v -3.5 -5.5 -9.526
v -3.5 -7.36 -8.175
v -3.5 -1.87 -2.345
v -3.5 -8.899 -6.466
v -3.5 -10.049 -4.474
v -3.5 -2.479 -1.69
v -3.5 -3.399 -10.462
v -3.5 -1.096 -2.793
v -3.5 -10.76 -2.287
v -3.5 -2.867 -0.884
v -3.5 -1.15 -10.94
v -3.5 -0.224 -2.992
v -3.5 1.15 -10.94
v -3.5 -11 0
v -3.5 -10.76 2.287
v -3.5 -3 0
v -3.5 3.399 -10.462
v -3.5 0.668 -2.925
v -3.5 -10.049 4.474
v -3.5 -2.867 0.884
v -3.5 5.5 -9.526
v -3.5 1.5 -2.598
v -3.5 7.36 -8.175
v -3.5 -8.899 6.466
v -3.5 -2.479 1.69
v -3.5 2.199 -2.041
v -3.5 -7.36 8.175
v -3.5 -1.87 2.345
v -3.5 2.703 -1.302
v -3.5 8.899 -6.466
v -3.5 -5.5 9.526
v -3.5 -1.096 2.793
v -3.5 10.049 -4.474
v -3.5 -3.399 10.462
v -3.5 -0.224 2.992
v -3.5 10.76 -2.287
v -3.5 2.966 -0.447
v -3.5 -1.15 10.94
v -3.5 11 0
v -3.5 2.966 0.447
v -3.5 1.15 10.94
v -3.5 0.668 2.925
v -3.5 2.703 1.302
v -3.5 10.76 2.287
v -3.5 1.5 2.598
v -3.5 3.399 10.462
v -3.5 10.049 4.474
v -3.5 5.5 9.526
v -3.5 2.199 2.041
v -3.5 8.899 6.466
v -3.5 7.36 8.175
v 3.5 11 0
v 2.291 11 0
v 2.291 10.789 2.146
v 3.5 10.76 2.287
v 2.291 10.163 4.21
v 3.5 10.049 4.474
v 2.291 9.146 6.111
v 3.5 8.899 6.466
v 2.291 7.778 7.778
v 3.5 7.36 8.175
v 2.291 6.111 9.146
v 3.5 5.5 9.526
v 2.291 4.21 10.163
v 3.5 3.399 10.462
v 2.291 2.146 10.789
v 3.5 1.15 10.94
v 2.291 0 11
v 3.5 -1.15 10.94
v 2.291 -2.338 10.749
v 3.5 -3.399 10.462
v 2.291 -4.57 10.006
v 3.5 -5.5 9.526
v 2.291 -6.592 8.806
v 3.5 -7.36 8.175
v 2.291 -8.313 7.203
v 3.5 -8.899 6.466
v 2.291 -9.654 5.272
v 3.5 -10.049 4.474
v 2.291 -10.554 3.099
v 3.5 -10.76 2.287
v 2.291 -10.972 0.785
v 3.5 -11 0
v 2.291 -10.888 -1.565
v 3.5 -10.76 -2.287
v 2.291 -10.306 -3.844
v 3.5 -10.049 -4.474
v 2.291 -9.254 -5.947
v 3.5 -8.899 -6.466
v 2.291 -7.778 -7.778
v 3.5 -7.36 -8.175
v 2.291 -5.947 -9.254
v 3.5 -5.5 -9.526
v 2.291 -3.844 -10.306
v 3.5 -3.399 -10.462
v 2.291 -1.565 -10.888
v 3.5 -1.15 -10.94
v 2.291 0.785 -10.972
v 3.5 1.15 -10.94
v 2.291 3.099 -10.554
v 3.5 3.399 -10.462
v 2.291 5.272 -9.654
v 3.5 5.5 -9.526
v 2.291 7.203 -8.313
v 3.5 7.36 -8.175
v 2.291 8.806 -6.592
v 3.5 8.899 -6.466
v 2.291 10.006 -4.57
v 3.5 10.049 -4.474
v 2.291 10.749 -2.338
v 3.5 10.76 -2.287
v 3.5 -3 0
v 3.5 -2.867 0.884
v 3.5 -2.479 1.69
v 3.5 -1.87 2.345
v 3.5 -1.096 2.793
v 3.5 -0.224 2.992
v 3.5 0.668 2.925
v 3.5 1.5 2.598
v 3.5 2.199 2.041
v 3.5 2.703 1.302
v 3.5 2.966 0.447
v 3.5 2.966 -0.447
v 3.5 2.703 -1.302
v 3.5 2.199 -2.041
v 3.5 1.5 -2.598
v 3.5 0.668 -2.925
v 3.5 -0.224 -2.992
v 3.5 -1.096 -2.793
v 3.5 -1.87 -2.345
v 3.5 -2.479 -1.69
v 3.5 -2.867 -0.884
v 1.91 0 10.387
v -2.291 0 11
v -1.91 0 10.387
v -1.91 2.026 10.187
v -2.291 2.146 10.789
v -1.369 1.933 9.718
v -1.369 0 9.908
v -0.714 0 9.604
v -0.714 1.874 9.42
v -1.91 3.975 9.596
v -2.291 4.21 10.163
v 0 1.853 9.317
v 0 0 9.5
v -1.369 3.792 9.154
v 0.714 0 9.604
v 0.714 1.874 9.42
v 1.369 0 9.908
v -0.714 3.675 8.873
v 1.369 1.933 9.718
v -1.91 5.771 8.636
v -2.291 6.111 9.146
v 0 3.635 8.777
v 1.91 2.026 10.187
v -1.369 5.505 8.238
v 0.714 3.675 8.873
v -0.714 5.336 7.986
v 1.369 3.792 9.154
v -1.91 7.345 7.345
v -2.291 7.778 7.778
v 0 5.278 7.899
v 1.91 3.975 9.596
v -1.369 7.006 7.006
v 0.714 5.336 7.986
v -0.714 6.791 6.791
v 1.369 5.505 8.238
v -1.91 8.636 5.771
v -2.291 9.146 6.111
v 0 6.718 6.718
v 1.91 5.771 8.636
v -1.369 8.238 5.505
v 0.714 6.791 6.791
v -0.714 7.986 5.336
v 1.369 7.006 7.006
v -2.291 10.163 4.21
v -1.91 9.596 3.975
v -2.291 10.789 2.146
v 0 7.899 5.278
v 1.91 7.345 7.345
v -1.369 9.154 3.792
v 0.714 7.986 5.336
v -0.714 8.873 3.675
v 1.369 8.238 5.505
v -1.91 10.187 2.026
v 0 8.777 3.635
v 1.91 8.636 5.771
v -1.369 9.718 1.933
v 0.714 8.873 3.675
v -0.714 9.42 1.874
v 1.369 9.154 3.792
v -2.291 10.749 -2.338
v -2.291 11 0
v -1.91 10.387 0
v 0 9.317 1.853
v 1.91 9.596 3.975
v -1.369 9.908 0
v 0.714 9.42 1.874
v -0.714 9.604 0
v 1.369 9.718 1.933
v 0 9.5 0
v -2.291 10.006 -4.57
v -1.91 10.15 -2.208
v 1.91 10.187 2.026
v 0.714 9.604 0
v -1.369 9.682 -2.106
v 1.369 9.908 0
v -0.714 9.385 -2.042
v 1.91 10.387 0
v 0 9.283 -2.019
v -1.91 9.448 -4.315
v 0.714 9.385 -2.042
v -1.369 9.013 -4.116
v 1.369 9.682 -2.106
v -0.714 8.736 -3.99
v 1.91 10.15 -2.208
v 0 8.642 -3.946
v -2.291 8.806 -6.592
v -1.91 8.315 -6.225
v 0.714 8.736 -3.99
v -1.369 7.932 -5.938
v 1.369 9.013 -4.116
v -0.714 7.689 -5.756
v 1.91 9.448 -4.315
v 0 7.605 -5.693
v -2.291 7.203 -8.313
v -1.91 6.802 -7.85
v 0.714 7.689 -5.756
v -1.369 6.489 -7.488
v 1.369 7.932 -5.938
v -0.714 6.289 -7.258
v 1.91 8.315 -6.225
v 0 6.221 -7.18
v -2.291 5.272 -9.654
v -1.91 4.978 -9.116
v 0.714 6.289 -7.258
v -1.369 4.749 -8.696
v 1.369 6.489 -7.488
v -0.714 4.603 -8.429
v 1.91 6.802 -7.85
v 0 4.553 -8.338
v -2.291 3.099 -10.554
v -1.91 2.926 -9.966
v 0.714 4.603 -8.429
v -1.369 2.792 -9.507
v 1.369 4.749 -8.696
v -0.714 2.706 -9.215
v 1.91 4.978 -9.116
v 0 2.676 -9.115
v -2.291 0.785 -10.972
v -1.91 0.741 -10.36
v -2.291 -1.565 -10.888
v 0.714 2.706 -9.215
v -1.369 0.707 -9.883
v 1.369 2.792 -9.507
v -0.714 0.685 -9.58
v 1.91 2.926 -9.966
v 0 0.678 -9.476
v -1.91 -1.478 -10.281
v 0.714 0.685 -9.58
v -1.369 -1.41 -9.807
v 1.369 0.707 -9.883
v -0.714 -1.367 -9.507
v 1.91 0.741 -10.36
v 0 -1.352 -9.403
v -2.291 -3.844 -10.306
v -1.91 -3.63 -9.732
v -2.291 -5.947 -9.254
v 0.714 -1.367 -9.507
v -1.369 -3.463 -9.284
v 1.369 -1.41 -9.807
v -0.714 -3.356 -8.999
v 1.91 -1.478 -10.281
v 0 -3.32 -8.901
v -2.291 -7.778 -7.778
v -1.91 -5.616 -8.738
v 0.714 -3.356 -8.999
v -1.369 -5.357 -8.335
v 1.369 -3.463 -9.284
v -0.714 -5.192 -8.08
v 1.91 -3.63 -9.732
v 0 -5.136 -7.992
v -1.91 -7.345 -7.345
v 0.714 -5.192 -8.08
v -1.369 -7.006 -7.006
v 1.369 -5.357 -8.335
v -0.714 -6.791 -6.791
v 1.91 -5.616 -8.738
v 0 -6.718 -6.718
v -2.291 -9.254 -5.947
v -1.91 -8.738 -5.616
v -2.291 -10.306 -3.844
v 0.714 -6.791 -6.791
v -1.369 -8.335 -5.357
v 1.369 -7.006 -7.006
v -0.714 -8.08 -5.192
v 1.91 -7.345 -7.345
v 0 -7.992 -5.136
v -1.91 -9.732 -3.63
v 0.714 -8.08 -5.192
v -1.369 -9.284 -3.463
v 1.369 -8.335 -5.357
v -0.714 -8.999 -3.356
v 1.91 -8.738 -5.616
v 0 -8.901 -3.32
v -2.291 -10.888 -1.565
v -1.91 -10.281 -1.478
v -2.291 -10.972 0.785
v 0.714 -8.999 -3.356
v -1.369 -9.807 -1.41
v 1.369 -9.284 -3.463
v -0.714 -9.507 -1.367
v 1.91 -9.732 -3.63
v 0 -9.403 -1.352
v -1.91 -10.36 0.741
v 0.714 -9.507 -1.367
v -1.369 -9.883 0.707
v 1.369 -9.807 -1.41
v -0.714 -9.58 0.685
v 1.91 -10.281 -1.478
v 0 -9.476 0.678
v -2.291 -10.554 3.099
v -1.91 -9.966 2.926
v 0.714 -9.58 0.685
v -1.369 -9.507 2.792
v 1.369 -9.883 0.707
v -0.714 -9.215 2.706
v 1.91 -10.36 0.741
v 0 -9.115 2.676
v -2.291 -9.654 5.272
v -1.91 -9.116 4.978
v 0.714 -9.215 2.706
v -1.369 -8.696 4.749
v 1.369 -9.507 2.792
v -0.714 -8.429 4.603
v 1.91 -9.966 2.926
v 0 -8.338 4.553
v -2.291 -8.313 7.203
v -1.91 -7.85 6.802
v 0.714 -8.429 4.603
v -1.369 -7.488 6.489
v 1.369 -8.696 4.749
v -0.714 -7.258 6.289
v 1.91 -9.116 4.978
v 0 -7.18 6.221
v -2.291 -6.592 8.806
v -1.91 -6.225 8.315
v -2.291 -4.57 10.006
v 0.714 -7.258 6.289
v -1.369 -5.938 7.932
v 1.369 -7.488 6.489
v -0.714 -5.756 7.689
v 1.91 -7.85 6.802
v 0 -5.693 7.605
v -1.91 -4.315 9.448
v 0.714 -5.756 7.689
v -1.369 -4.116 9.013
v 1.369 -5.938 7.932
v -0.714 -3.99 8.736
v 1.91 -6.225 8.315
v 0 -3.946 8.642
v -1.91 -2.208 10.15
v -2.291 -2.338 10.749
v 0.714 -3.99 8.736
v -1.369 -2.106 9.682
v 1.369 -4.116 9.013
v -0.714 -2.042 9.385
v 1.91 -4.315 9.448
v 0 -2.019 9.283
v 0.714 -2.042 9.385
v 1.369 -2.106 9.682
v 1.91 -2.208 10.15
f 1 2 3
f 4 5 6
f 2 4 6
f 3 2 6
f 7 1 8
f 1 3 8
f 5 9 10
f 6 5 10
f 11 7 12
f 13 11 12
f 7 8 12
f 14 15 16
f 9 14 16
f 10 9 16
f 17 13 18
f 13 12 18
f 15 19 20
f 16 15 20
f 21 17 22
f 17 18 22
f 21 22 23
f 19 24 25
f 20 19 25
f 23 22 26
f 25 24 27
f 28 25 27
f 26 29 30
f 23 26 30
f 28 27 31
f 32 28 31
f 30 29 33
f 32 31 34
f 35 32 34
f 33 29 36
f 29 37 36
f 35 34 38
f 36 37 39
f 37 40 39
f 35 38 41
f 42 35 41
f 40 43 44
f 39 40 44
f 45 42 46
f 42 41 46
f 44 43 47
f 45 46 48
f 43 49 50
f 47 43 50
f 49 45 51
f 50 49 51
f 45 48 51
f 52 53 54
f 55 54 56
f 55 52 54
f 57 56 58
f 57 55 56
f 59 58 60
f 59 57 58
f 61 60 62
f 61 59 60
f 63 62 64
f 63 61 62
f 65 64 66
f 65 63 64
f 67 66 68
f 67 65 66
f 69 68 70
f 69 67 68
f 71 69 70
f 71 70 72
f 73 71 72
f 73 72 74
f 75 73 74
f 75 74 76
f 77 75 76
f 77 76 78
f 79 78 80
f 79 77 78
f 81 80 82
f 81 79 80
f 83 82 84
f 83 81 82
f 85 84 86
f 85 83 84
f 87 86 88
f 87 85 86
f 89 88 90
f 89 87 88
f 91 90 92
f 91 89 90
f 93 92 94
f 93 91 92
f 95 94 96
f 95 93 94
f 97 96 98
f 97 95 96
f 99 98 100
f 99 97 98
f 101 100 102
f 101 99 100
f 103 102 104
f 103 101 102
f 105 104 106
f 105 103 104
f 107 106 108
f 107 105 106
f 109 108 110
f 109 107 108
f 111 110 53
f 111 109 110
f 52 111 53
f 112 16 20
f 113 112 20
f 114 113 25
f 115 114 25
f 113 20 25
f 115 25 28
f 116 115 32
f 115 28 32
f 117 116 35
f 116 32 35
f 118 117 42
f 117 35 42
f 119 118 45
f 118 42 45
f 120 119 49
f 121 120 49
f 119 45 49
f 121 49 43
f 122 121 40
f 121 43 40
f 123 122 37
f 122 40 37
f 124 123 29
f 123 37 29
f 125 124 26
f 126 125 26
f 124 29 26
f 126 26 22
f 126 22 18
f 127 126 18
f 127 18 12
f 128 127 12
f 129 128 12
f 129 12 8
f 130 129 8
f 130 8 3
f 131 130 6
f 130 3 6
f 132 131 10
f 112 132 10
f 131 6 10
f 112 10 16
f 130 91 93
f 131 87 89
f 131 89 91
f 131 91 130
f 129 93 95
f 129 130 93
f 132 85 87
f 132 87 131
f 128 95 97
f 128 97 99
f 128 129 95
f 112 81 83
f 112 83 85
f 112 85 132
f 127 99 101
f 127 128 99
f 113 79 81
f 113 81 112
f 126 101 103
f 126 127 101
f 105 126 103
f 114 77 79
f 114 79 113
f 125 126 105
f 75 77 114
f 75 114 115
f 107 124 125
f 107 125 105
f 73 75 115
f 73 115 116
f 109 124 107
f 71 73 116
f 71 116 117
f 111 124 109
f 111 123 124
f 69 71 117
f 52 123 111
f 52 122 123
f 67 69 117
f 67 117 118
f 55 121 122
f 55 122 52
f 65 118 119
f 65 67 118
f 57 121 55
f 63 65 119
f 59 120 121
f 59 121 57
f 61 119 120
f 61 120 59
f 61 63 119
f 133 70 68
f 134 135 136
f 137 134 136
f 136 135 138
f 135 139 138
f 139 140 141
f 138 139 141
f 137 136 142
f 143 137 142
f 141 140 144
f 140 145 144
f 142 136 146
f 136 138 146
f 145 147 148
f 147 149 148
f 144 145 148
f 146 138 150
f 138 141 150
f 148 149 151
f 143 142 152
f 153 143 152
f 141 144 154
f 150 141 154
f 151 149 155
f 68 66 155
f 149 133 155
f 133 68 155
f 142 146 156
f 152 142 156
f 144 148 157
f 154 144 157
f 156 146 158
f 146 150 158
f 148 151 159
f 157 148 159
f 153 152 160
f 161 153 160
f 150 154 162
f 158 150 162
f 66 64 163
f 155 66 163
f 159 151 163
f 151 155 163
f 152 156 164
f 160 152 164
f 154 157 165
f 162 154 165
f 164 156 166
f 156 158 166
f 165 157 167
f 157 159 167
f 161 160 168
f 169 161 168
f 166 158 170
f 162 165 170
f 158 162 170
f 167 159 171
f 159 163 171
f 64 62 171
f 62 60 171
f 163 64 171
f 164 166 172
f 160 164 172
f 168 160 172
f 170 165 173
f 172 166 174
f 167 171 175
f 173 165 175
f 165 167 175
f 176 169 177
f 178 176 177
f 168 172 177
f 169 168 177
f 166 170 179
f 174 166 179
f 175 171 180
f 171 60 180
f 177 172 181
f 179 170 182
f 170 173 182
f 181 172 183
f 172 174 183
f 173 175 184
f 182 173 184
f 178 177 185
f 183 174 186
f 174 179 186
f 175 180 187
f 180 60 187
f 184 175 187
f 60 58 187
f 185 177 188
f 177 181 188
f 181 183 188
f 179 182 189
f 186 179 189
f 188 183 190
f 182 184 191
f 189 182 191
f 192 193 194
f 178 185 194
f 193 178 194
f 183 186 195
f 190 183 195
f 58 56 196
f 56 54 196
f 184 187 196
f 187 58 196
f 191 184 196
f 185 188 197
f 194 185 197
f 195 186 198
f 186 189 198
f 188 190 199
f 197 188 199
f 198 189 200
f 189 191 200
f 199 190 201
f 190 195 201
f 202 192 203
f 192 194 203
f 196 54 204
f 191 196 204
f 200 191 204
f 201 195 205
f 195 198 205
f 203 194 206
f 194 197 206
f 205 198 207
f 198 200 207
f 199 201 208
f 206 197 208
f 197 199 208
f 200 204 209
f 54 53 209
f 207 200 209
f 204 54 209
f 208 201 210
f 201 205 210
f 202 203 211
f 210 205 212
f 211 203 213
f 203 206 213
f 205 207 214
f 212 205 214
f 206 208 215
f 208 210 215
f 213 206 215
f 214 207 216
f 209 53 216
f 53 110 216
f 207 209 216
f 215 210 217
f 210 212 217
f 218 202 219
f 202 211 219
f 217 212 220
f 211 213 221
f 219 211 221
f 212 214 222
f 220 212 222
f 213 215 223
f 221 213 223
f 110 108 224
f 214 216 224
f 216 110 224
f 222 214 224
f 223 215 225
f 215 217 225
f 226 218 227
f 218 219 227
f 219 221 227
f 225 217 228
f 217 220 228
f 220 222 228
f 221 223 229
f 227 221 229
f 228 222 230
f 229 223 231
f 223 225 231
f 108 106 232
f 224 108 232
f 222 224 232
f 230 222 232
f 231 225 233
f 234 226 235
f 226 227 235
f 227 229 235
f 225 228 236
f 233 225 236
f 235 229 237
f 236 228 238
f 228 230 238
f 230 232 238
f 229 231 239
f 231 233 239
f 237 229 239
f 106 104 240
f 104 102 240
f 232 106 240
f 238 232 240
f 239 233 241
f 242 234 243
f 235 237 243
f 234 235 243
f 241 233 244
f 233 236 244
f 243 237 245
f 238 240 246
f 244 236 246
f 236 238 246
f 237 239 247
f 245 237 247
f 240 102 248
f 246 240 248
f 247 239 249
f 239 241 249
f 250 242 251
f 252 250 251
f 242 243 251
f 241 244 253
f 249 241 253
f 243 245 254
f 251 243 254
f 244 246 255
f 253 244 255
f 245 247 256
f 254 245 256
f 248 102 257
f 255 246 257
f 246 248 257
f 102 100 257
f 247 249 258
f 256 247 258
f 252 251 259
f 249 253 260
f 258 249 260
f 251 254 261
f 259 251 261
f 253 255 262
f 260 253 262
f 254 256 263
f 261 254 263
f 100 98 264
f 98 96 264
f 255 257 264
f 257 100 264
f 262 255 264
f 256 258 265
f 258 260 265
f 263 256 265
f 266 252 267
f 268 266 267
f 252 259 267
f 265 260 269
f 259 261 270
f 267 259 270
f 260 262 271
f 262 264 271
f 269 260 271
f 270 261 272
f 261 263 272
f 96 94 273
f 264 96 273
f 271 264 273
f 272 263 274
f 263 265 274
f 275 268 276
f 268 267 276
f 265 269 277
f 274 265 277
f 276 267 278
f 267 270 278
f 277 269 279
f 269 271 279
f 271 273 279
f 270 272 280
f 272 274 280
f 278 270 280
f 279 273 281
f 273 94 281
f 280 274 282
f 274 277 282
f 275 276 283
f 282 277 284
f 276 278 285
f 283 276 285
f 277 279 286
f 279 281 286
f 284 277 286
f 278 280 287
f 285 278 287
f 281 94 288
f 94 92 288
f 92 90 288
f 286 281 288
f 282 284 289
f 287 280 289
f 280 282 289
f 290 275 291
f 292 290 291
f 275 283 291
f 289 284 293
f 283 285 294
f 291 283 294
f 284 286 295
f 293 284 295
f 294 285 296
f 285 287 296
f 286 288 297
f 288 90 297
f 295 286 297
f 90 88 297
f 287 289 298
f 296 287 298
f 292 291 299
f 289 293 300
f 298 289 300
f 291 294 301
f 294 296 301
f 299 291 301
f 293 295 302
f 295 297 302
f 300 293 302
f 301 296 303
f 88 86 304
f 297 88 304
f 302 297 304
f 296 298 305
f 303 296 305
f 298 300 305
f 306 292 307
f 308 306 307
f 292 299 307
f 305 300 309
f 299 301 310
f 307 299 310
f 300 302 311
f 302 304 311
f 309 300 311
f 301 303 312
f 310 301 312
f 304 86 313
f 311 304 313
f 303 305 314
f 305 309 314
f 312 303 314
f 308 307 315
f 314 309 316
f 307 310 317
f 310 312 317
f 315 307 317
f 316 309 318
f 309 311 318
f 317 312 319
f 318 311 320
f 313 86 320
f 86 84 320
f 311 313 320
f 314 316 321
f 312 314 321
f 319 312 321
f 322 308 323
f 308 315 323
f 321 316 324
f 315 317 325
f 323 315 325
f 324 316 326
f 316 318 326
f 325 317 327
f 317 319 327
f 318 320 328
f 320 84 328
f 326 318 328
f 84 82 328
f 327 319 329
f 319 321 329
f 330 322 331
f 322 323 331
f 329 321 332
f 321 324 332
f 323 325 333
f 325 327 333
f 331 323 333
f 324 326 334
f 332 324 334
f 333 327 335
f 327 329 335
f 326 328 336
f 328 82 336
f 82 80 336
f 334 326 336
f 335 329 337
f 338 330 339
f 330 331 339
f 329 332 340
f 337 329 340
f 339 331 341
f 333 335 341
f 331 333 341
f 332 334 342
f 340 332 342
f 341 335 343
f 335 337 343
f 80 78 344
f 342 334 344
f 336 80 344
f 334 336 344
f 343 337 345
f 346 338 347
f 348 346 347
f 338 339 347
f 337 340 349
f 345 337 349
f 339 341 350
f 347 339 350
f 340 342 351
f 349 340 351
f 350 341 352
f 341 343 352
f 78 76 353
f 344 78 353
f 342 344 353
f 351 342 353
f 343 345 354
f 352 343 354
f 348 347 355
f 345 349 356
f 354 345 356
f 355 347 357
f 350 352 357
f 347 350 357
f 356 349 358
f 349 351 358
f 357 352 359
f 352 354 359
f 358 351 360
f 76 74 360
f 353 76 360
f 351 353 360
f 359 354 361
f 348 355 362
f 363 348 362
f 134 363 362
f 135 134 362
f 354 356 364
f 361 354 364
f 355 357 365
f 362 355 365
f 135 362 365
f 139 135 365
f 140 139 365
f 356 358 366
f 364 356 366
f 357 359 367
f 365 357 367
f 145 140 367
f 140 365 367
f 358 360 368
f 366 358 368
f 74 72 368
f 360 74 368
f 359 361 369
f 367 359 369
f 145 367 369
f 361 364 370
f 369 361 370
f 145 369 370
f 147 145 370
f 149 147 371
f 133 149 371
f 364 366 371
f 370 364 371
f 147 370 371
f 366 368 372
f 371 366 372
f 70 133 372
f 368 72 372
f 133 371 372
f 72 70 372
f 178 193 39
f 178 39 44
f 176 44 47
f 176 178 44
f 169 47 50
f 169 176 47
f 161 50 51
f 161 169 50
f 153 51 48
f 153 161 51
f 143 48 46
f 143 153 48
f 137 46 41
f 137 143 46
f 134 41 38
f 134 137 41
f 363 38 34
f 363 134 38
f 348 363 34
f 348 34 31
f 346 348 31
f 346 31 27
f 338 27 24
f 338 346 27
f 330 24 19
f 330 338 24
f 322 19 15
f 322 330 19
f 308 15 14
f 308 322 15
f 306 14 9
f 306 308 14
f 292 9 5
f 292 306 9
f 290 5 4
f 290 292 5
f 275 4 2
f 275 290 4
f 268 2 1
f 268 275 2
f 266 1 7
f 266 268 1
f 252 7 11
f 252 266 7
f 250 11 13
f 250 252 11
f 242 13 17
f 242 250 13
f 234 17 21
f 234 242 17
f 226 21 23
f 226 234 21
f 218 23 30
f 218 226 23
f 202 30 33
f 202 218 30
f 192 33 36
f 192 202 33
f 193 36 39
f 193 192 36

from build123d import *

# Parameters (mm, degrees)
F0_R          = 11
F1_DEPTH      = 3.5
F1_DEPTH_BACK = 3.5
F2_R          = 2.5
F4_R          = 3
F5_DEPTH      = 7


with BuildPart() as f1:
    # F0 (on Right) → F1 (new body, two sides)
    with BuildSketch(Plane.YZ) as f1_sk:
        Circle(F0_R)
    extrude(amount=F1_DEPTH)
    extrude(f1_sk.sketch, amount=-F1_DEPTH_BACK)

    # F2 (on Front) → F3 (revolve, cut)
    with BuildSketch(Plane.XZ):
        with Locations((0, 12)):
            Circle(F2_R)
    revolve(axis=Axis((-5, 0, 0), (-1, 0, 0)), mode=Mode.SUBTRACT)

    # F4 (on face) → F5 (cut, through all)
    with BuildSketch(Plane(origin=(-3.5, 0, 0), x_dir=(0, -1, 0), z_dir=(-1, 0, 0))):
        Circle(F4_R)
    extrude(amount=-F5_DEPTH, mode=Mode.SUBTRACT)


solid = f1.part
